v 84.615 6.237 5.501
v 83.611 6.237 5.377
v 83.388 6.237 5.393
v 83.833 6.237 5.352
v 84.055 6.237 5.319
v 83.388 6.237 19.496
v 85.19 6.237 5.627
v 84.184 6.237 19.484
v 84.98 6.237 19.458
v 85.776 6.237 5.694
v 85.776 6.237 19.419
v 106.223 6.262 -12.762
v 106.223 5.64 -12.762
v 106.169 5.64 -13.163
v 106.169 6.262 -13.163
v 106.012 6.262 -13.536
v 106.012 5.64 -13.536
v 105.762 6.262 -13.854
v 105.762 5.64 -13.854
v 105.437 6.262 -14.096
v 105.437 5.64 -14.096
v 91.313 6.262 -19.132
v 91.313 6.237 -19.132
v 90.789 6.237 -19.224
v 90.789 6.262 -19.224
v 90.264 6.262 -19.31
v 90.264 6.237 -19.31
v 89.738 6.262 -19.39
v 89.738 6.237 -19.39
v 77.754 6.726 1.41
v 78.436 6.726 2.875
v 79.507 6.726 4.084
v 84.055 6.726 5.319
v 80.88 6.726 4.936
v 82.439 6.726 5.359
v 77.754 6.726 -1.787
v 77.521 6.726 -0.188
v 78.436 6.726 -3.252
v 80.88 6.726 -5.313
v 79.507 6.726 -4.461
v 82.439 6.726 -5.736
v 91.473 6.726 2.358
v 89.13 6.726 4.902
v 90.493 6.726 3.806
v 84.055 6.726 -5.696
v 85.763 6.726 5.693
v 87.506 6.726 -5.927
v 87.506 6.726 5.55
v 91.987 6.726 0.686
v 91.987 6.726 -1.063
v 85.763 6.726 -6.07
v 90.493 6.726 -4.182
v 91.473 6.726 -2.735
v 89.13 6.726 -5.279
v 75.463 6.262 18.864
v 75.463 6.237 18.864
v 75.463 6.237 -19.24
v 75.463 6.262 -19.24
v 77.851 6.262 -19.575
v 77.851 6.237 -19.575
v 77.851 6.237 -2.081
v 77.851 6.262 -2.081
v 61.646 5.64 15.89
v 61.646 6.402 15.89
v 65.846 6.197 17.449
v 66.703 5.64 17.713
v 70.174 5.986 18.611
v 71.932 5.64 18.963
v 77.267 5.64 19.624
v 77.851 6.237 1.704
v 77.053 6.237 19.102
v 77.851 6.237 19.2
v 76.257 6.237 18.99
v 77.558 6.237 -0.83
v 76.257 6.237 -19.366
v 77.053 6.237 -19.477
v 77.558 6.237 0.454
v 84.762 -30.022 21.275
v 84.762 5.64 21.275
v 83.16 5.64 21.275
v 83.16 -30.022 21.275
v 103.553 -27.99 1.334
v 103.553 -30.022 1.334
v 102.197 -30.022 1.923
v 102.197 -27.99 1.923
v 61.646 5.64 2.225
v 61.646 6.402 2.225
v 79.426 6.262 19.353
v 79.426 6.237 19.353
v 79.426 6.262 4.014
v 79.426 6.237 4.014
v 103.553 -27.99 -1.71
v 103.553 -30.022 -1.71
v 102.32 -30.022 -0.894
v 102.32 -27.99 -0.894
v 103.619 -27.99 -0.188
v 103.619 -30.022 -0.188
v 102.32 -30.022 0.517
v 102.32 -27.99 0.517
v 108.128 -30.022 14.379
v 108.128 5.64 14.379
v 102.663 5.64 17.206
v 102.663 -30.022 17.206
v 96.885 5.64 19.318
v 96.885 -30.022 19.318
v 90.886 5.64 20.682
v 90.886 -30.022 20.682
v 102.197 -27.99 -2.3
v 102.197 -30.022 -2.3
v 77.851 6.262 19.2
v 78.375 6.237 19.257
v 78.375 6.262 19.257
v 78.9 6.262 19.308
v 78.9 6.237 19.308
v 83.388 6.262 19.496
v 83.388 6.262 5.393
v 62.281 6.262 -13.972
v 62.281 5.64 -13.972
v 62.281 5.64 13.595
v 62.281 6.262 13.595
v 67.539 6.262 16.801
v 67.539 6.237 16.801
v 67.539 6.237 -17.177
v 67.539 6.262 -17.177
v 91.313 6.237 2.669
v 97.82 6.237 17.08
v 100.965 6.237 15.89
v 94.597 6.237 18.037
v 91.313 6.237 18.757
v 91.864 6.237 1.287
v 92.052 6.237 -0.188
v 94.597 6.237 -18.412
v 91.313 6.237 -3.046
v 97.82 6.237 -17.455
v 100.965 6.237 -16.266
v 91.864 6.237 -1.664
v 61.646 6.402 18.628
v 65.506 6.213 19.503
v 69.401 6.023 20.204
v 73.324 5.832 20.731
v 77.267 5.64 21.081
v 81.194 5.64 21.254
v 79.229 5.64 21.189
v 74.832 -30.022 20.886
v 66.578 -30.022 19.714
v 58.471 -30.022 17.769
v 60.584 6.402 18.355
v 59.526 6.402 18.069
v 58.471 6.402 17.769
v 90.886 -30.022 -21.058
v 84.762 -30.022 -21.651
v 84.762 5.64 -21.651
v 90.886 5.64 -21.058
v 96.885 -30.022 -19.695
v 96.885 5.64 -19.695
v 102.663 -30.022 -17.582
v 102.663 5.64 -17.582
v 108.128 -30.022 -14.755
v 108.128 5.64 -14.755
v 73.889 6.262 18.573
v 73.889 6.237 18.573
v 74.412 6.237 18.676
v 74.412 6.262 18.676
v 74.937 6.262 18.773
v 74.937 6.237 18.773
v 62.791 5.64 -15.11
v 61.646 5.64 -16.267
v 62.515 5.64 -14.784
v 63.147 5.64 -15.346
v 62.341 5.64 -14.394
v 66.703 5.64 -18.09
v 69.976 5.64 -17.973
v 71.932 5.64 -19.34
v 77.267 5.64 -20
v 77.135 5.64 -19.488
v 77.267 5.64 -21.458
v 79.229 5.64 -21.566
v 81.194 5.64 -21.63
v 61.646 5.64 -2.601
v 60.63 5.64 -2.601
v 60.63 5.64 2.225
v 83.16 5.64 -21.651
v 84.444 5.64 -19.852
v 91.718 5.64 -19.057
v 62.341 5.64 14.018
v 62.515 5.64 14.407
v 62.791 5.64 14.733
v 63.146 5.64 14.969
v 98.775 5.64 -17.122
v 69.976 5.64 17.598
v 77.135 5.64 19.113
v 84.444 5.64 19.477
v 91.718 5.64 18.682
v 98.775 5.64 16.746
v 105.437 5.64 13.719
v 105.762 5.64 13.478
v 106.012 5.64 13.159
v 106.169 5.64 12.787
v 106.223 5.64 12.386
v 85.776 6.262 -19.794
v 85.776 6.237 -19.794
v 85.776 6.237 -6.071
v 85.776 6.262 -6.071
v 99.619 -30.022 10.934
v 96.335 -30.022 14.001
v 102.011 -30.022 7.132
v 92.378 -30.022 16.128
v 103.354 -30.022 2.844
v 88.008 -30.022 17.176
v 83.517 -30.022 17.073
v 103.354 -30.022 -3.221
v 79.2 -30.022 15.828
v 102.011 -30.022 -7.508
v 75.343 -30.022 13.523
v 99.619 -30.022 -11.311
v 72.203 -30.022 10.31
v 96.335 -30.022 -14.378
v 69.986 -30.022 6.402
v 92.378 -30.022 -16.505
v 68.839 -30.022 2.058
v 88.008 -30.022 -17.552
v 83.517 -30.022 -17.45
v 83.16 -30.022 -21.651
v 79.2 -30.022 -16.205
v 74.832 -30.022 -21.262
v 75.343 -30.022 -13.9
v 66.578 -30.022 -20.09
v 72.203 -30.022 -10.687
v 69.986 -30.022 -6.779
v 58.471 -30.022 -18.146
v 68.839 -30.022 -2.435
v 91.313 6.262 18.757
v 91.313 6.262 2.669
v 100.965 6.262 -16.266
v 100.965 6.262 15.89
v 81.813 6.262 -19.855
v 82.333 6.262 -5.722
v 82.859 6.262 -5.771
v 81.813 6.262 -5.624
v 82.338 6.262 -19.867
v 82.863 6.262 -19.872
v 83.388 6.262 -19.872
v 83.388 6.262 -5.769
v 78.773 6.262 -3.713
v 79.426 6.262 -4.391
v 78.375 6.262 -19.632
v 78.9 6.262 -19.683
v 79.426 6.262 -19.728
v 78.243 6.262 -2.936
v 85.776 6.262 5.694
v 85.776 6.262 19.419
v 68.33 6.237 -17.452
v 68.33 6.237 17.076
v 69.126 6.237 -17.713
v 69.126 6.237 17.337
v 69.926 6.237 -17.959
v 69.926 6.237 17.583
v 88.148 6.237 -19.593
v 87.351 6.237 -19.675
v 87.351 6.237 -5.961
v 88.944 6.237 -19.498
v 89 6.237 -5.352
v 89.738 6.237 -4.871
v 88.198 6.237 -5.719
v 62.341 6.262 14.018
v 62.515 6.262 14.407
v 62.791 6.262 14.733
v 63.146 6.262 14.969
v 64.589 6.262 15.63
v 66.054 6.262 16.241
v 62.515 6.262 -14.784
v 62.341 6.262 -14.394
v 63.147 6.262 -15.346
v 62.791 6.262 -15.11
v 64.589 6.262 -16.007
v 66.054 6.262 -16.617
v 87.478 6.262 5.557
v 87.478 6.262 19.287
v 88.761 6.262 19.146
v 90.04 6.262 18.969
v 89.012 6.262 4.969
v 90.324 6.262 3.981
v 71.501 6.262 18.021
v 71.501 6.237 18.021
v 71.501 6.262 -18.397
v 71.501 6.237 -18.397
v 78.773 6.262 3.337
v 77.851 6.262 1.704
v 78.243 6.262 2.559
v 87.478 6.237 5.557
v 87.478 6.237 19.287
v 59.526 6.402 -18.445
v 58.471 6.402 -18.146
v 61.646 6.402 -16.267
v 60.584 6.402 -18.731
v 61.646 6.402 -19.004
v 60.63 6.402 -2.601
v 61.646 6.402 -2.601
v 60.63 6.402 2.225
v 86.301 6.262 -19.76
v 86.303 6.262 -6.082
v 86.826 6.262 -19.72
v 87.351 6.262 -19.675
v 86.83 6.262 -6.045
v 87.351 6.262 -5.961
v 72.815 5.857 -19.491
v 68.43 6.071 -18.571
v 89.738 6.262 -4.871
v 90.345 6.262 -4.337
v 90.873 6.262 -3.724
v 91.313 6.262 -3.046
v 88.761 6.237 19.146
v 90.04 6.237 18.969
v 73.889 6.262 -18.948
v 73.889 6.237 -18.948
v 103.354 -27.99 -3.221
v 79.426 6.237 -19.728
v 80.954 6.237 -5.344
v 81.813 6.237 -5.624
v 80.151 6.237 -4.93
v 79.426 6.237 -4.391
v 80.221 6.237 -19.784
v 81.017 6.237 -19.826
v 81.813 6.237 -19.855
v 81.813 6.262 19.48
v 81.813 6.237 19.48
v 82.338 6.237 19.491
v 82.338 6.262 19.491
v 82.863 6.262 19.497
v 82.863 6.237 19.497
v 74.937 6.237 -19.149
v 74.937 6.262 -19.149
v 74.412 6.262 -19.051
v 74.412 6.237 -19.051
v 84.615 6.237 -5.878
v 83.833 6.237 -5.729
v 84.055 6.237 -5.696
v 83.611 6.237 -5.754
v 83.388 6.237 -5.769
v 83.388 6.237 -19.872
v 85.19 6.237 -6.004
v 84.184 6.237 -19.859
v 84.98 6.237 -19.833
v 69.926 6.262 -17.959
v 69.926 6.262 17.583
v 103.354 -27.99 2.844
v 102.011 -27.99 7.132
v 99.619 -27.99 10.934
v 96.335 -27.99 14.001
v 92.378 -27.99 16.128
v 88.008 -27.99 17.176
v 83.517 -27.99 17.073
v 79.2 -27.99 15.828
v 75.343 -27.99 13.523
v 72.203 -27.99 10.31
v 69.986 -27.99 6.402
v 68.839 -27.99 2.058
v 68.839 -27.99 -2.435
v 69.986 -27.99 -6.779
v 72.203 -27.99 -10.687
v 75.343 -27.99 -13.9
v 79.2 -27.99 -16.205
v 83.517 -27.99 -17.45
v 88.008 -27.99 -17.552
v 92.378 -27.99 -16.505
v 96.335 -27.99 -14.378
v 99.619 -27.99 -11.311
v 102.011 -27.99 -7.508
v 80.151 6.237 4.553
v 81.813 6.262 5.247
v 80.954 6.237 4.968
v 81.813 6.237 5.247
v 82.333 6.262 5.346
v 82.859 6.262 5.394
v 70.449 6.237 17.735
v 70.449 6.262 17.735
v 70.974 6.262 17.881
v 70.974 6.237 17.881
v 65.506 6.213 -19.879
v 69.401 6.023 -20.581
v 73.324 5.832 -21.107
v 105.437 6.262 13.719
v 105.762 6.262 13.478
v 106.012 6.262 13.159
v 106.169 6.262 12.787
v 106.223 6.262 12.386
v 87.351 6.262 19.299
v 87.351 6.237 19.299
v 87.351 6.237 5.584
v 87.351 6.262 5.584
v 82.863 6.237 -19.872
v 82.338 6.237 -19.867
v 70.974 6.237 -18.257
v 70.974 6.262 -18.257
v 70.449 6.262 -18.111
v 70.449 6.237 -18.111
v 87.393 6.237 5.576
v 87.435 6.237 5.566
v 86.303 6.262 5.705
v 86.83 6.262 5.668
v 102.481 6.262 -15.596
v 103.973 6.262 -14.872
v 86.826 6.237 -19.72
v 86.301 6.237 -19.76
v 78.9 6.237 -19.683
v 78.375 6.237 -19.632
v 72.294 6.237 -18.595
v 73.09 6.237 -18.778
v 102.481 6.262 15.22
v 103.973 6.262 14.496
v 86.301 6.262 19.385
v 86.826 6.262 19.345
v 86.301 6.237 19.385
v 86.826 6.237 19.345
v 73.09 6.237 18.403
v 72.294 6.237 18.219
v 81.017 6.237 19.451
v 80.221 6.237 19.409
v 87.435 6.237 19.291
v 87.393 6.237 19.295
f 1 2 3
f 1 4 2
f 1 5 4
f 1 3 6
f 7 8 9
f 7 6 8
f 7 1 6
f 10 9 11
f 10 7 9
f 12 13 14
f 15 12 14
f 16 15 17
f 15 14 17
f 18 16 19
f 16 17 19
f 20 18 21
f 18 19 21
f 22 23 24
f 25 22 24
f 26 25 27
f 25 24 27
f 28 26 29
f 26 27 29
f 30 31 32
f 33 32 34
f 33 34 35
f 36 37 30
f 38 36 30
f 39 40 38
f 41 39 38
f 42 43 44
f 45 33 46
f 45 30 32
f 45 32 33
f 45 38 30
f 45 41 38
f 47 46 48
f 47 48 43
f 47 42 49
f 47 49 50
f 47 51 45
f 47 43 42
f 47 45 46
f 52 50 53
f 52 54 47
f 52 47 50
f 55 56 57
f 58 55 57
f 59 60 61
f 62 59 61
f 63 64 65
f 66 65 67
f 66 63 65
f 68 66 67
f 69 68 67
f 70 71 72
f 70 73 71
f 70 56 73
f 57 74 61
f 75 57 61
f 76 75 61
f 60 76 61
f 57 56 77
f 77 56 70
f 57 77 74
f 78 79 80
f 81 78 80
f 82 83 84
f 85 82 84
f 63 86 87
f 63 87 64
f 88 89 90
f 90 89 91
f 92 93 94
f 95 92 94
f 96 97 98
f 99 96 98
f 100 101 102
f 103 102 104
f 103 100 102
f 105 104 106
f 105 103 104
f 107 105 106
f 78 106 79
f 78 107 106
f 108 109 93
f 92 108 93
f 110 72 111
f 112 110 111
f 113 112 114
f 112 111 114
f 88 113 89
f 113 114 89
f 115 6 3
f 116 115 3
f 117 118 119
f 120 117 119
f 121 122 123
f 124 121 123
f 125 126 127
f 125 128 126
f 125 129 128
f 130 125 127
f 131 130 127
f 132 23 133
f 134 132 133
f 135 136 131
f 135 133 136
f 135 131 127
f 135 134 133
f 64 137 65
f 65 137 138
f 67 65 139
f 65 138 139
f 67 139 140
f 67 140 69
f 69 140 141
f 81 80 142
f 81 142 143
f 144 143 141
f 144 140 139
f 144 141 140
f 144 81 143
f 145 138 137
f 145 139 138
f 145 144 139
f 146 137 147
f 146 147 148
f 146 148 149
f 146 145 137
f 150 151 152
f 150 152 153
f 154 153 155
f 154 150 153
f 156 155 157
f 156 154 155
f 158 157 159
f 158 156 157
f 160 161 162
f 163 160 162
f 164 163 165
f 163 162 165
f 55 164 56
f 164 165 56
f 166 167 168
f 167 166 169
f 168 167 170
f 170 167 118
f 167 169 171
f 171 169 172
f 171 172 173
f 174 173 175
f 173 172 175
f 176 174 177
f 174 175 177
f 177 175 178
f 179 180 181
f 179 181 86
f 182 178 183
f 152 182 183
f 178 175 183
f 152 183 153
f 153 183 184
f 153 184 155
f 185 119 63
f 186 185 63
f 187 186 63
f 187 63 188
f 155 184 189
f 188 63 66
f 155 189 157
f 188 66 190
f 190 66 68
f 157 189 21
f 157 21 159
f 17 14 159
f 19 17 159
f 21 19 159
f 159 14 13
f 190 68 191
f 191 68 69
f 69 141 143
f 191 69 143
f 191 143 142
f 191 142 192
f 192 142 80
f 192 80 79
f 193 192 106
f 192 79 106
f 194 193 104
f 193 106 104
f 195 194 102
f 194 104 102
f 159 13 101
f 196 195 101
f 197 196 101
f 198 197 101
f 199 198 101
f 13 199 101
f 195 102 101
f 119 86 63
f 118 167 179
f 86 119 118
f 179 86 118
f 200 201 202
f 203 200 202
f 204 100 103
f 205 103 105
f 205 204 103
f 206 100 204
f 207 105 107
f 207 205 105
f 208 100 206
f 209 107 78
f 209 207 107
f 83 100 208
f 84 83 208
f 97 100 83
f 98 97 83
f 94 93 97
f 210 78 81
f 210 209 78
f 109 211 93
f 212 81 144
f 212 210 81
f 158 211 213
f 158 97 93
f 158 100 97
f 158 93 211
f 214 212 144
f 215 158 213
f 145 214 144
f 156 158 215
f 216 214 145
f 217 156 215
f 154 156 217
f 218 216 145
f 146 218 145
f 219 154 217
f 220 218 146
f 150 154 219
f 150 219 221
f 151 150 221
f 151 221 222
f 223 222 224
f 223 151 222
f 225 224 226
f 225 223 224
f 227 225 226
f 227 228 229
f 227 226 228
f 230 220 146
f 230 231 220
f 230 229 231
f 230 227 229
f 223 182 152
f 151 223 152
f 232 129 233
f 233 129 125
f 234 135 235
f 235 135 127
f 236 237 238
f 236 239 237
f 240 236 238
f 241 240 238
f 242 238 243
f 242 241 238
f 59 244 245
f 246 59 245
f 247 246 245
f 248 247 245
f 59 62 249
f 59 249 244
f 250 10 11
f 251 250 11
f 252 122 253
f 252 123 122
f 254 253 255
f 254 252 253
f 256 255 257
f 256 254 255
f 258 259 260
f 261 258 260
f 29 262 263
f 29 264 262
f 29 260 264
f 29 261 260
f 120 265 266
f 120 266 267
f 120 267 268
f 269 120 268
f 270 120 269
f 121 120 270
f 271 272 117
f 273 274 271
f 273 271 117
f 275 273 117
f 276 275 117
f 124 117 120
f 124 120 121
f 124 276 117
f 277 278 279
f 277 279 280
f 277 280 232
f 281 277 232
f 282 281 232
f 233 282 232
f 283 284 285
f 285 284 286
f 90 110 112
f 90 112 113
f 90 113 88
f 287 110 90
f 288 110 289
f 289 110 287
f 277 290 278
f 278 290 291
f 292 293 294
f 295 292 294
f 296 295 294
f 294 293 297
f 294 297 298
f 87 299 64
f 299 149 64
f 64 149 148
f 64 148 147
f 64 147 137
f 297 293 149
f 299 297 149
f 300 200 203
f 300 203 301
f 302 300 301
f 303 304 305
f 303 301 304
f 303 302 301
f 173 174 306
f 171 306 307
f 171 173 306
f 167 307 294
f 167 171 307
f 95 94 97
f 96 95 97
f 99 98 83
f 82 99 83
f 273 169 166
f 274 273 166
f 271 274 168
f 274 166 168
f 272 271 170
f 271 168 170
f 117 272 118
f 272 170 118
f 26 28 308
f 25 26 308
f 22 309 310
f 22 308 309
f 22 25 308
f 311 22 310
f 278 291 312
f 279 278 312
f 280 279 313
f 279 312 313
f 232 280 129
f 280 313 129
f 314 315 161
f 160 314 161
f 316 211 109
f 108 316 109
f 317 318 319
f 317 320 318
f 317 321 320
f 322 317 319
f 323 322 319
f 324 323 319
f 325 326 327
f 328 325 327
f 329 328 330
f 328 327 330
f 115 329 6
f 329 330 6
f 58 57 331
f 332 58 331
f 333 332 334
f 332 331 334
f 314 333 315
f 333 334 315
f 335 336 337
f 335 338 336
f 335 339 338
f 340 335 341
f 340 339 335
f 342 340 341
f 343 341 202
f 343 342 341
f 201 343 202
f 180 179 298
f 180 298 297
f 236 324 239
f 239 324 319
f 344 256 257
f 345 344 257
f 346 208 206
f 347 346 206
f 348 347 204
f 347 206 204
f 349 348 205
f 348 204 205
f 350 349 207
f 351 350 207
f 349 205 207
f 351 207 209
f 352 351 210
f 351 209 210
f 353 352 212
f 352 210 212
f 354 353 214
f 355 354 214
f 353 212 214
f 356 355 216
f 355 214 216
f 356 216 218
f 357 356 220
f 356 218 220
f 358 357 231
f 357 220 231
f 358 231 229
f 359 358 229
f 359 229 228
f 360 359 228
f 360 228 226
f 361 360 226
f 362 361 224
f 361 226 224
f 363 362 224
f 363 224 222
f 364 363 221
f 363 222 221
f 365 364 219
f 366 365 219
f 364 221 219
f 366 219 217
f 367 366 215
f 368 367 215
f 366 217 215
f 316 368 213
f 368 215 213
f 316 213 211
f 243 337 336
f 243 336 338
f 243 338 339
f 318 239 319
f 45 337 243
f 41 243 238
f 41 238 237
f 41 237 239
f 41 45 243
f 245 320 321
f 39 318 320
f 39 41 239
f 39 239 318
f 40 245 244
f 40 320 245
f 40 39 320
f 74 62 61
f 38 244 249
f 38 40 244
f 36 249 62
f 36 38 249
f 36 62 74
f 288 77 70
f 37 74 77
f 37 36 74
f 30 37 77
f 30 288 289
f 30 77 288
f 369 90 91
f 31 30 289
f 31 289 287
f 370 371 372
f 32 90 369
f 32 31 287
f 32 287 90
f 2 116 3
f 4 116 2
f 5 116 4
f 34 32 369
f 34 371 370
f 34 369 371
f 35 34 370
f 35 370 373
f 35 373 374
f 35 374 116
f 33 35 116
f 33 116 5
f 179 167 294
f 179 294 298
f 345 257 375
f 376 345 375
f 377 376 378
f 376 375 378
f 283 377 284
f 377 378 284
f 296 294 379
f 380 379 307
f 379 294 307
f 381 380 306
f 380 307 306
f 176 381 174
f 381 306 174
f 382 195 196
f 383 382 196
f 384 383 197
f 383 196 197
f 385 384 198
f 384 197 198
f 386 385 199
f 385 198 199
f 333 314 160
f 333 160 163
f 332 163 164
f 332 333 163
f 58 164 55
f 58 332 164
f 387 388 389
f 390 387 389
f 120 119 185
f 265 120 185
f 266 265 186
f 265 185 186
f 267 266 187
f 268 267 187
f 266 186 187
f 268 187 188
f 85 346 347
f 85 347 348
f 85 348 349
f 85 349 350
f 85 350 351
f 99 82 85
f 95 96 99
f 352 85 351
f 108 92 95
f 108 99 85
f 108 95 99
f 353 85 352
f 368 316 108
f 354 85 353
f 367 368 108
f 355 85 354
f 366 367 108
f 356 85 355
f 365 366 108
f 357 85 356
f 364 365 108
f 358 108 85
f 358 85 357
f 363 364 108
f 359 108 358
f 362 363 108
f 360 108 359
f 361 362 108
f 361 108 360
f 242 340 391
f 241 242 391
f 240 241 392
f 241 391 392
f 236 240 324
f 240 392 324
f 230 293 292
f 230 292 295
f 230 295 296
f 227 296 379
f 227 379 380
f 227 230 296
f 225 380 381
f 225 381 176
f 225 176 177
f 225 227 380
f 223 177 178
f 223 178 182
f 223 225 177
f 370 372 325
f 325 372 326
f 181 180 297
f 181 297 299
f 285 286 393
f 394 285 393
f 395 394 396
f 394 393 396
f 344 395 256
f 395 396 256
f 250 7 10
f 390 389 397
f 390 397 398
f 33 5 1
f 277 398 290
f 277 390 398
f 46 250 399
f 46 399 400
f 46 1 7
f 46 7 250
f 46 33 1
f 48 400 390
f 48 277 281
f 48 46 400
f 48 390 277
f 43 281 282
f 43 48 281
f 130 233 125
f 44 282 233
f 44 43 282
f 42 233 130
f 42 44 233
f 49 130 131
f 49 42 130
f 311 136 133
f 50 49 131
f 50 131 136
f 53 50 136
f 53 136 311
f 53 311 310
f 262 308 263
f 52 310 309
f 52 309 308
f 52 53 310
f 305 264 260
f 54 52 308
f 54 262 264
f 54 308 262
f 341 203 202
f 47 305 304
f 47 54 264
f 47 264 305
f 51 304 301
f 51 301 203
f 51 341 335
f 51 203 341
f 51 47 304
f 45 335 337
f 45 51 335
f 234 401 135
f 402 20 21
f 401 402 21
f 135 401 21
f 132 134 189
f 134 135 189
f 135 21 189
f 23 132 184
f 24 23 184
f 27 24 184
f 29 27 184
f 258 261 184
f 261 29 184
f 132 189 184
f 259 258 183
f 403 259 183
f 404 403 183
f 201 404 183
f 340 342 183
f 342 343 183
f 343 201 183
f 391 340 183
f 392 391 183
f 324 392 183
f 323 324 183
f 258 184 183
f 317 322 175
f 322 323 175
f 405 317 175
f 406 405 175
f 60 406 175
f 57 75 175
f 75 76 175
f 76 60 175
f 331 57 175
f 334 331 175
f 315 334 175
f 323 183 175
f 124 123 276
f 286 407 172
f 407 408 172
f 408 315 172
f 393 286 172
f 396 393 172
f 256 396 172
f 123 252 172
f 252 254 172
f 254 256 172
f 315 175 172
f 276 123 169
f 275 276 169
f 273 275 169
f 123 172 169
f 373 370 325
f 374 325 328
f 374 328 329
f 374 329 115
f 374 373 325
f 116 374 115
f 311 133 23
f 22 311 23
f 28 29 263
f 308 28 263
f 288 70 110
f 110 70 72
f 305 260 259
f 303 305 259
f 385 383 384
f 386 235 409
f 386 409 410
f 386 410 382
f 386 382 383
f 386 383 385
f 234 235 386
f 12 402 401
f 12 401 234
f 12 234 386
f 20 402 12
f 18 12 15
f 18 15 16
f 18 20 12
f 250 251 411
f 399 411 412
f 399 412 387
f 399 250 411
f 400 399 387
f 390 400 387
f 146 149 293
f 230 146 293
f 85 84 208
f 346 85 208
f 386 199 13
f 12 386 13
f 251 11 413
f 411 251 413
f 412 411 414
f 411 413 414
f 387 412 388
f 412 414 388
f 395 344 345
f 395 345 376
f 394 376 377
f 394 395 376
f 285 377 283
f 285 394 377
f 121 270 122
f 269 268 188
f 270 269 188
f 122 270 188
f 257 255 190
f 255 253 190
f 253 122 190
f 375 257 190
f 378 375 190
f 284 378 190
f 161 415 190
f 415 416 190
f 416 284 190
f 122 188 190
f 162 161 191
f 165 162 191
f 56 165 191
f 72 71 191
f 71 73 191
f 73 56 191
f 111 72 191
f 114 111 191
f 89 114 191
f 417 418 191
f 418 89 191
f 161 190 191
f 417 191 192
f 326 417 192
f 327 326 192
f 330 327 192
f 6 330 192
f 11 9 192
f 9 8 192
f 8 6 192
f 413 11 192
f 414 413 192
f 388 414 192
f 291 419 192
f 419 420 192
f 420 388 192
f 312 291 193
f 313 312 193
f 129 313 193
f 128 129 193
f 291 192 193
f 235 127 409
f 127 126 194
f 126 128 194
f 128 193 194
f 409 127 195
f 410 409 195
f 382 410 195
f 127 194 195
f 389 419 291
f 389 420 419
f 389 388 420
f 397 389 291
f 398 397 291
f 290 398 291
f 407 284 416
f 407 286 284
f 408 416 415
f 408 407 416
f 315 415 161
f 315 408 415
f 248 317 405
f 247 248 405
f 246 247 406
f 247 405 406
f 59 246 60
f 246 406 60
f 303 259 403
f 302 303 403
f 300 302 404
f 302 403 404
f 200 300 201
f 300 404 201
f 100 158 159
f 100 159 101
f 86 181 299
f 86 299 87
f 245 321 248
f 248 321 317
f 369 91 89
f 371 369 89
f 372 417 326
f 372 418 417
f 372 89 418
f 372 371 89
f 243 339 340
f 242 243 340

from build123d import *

# Parameters (mm, degrees)
BOSS_EXTRUDE1_DEPTH      = 40
CUT_EXTRUDE1_DEPTH       = 40
CUT_EXTRUDE1_DEPTH_BACK  = 40
CUT_EXTRUDE2_DEPTH       = 40
BOSS_EXTRUDE2_DEPTH      = 0.6223
CUT_EXTRUDE3_DEPTH       = 0.0254
CUT_EXTRUDE4_DEPTH       = 2.032
BOSS_EXTRUDE3_DEPTH      = 0.464
BOSS_EXTRUDE3_DEPTH_BACK = 0.464


with BuildPart() as part:
    # Sketch1 → Boss-Extrude1 (new body)
    with BuildSketch(Plane(origin=(0, -30.021892368, 0), x_dir=(-1, 0, 0), z_dir=(0, -1, 0))):
        with BuildLine():
            Line((-83.1596, 21.651358884), (-84.762120236, 21.651358884))
            ThreePointArc((-84.762120236, 21.651358884), (-96.885117924, 19.694671586), (-108.1278, 14.755258884))
            Line((-108.1278, 14.755258884), (-108.1278, -14.378541116))
            ThreePointArc((-108.1278, -14.378541116), (-96.885117924, -19.317953818), (-84.762120236, -21.274641116))
            Line((-84.762120236, -21.274641116), (-83.1596, -21.274641116))
            ThreePointArc((-83.1596, -21.274641116), (-70.690971885, -20.397039146), (-58.4708, -17.769441116))
            Line((-58.4708, -17.769441116), (-58.4708, 18.146158884))
            ThreePointArc((-58.4708, 18.146158884), (-70.690971885, 20.773756915), (-83.1596, 21.651358884))
        make_face()
    extrude(amount=-BOSS_EXTRUDE1_DEPTH)

    # Sketch2 → Cut-Extrude1 (cut, two sides)
    with BuildSketch(Plane.XY) as cut_extrude1_sk:
        Polygon((54.820843696, 15.118469848), (54.820843696, 6.401707632), (61.6458, 6.401707632), (77.2668, 5.639707632), (110.448229866, 5.639707632), (110.448229866, 15.118469848), align=None)
    extrude(amount=CUT_EXTRUDE1_DEPTH, mode=Mode.SUBTRACT)
    extrude(cut_extrude1_sk.sketch, amount=-CUT_EXTRUDE1_DEPTH_BACK, mode=Mode.SUBTRACT)

    # Sketch3 → Cut-Extrude2 (cut)
    with BuildSketch(Plane(origin=(0, 5.639707632, 0), x_dir=(1, 0, 0), z_dir=(0, 1, 0))):
        with BuildLine():
            Line((60.6298, -2.224641116), (61.6458, -2.224641116))
            Line((61.6458, -2.224641116), (61.6458, -15.889841116))
            ThreePointArc((61.6458, -15.889841116), (69.299882493, -18.411140892), (77.2668, -19.623641116))
            Line((77.2668, -19.623641116), (77.2668, -24.484863345))
            Line((77.2668, -24.484863345), (116.145527093, -24.484863345))
            Line((116.145527093, -24.484863345), (116.145527093, 24.141945465))
            Line((116.145527093, 24.141945465), (77.2668, 24.141945465))
            Line((77.2668, 24.141945465), (77.2668, 20.000358884))
            ThreePointArc((77.2668, 20.000358884), (69.299882493, 18.78785866), (61.6458, 16.266558884))
            Line((61.6458, 16.266558884), (61.6458, 2.601358884))
            Line((61.6458, 2.601358884), (60.6298, 2.601358884))
            Line((60.6298, 2.601358884), (60.6298, -2.224641116))
        make_face()
    extrude(amount=CUT_EXTRUDE2_DEPTH, mode=Mode.SUBTRACT)

    # Sketch4 → Boss-Extrude2 (add)
    with BuildSketch(Plane(origin=(0, 5.639707632, 0), x_dir=(1, 0, 0), z_dir=(0, 1, 0))):
        with BuildLine():
            Line((62.2808, 13.97160372), (62.2808, -13.595028424))
            ThreePointArc((62.2808, -13.595028424), (62.515232291, -14.407180579), (63.146405148, -14.969470936))
            ThreePointArc((63.146405148, -14.969470936), (84.443626018, -19.477271857), (105.437261458, -13.718873038))
            ThreePointArc((105.437261458, -13.718873038), (106.011810141, -13.159417141), (106.2228, -12.385737382))
            Line((106.2228, -12.385737382), (106.2228, 12.76231749))
            ThreePointArc((106.2228, 12.76231749), (106.011758355, 13.536085129), (105.437082995, 14.095551986))
            ThreePointArc((105.437082995, 14.095551986), (84.443582525, 19.852401671), (63.146588971, 15.346134273))
            ThreePointArc((63.146588971, 15.346134273), (62.515286602, 14.783842106), (62.2808, 13.97160372))
        make_face()
    extrude(amount=BOSS_EXTRUDE2_DEPTH)

    # Sketch5 → Cut-Extrude3 (cut)
    with BuildSketch(Plane(origin=(0, 6.236607632, 0), x_dir=(1, 0, 0), z_dir=(0, 1, 0))):
        Polygon((60.8798, -1.974641116), (61.8958, -1.974641116), (61.8958, -15.724128062), (70.725222183, -18.261597014), (77.5168, -19.389388124), (77.5168, -26.279232644), (112.598613265, -26.279232644), (112.598613265, 26.642797699), (77.5168, 26.642797699), (77.5168, 19.766105893), (68.79799987, 18.208824767), (61.8958, 16.100845831), (61.8958, 2.351358884), (60.8798, 2.351358884), align=None)
        with BuildLine():
            Line((106.2228, -12.385737382), (106.2228, 12.76231749))
            ThreePointArc((106.2228, 12.76231749), (106.011758355, 13.536085129), (105.437082995, 14.095551986))
            ThreePointArc((105.437082995, 14.095551986), (103.230284294, 15.241015763), (100.965, 16.26597178))
            Line((100.965, 16.26597178), (100.965, -15.890015871))
            ThreePointArc((100.965, -15.890015871), (103.230393421, -14.864721653), (105.437261458, -13.718873038))
            ThreePointArc((105.437261458, -13.718873038), (106.011810141, -13.159417141), (106.2228, -12.385737382))
        make_face(mode=Mode.SUBTRACT)
        with BuildLine():
            Line((87.4776, -5.556736292), (87.4776, -19.287368321))
            ThreePointArc((87.4776, -19.287368321), (89.400866501, -19.062397708), (91.313, -18.756928734))
            Line((91.313, -18.756928734), (91.313, 19.132183186))
            ThreePointArc((91.313, 19.132183186), (90.526712944, 19.267736149), (89.7382, 19.389675799))
            Line((89.7382, 19.389675799), (89.7382, 4.870687927))
            Line((89.7382, 4.870687927), (87.4776, -5.556736292))
        make_face(mode=Mode.SUBTRACT)
        with BuildLine():
            Line((87.3506, -19.299351408), (87.3506, 19.674500659))
            ThreePointArc((87.3506, 19.674500659), (86.56371005, 19.740853373), (85.7758, 19.79373275))
            Line((85.7758, 19.79373275), (85.7758, -19.418600488))
            ThreePointArc((85.7758, -19.418600488), (86.563710251, -19.365714311), (87.3506, -19.299351408))
        make_face(mode=Mode.SUBTRACT)
        with BuildLine():
            Line((83.3882, -19.496401918), (83.3882, 19.871534346))
            ThreePointArc((83.3882, 19.871534346), (82.60073032, 19.870084861), (81.8134, 19.855199773))
            Line((81.8134, 19.855199773), (81.8134, -19.480050269))
            ThreePointArc((81.8134, -19.480050269), (82.600730229, -19.49494558), (83.3882, -19.496401918))
        make_face(mode=Mode.SUBTRACT)
        with BuildLine():
            Line((79.4258, -19.352519351), (79.4258, 19.727720695))
            ThreePointArc((79.4258, 19.727720695), (78.637747467, 19.658336413), (77.851, 19.575454588))
            Line((77.851, 19.575454588), (77.851, -19.200201536))
            ThreePointArc((77.851, -19.200201536), (78.63774708, -19.283110929), (79.4258, -19.352519351))
        make_face(mode=Mode.SUBTRACT)
        with BuildLine():
            Line((73.8886, 18.948166135), (73.8886, -18.57271762))
            ThreePointArc((73.8886, -18.57271762), (74.674734009, -18.725427281), (75.4634, -18.864469988))
            Line((75.4634, -18.864469988), (75.4634, 19.239829185))
            ThreePointArc((75.4634, 19.239829185), (74.674734726, 19.100829354), (73.8886, 18.948166135))
        make_face(mode=Mode.SUBTRACT)
        with BuildLine():
            Line((69.9262, 17.958552472), (69.9262, -17.58280399))
            ThreePointArc((69.9262, -17.58280399), (70.711659458, -17.808862859), (71.501, -18.020972927))
            Line((71.501, -18.020972927), (71.501, 18.396588518))
            ThreePointArc((71.501, 18.396588518), (70.711660575, 18.184542996), (69.9262, 17.958552472))
        make_face(mode=Mode.SUBTRACT)
        with BuildLine():
            Line((67.5386, -16.801329329), (67.5386, 17.177317791))
            ThreePointArc((67.5386, 17.177317791), (65.318978341, 16.31836829), (63.146588971, 15.346134273))
            ThreePointArc((63.146588971, 15.346134273), (62.515286602, 14.783842106), (62.2808, 13.97160372))
            Line((62.2808, 13.97160372), (62.2808, -13.595028424))
            ThreePointArc((62.2808, -13.595028424), (62.515232309, -14.407180609), (63.146405211, -14.969470967))
            ThreePointArc((63.146405211, -14.969470967), (65.318869691, -15.942064117), (67.5386, -16.801329329))
        make_face(mode=Mode.SUBTRACT)
    extrude(amount=CUT_EXTRUDE3_DEPTH, mode=Mode.SUBTRACT)

    # Sketch6 → Cut-Extrude4 (cut)
    with BuildSketch(Plane(origin=(0, -30.021892368, 0), x_dir=(-1, 0, 0), z_dir=(0, -1, 0))):
        with BuildLine():
            Line((-103.354005387, 3.220690187), (-102.196585301, 2.30003668))
            Line((-102.196585301, 2.30003668), (-103.552849915, 1.710316042))
            Line((-103.552849915, 1.710316042), (-102.319593922, 0.894041707))
            Line((-102.319593922, 0.894041707), (-103.6193, 0.188358884))
            Line((-103.6193, 0.188358884), (-102.319593922, -0.517323938))
            Line((-102.319593922, -0.517323938), (-103.552849915, -1.333598274))
            Line((-103.552849915, -1.333598274), (-102.196585301, -1.923318911))
            Line((-102.196585301, -1.923318911), (-103.354005387, -2.843972418))
            ThreePointArc((-103.354005387, -2.843972418), (-68.6943, 0.188358884), (-103.354005387, 3.220690187))
        make_face()
    extrude(amount=-CUT_EXTRUDE4_DEPTH, mode=Mode.SUBTRACT)

    # Sketch7 → Boss-Extrude3 (add, two sides)
    with BuildSketch(Plane(origin=(0, 6.262007632, 0), x_dir=(1, 0, 0), z_dir=(0, 1, 0))) as boss_extrude3_sk:
        with BuildLine():
            ThreePointArc((84.054570469, -5.319023636), (92.051766601, 0.188358884), (84.054570469, 5.695741404))
            ThreePointArc((84.054570469, 5.695741404), (77.5208, 0.188358884), (84.054570469, -5.319023636))
        make_face()
    extrude(amount=BOSS_EXTRUDE3_DEPTH)
    extrude(boss_extrude3_sk.sketch, amount=-BOSS_EXTRUDE3_DEPTH_BACK)


solid = part.part
